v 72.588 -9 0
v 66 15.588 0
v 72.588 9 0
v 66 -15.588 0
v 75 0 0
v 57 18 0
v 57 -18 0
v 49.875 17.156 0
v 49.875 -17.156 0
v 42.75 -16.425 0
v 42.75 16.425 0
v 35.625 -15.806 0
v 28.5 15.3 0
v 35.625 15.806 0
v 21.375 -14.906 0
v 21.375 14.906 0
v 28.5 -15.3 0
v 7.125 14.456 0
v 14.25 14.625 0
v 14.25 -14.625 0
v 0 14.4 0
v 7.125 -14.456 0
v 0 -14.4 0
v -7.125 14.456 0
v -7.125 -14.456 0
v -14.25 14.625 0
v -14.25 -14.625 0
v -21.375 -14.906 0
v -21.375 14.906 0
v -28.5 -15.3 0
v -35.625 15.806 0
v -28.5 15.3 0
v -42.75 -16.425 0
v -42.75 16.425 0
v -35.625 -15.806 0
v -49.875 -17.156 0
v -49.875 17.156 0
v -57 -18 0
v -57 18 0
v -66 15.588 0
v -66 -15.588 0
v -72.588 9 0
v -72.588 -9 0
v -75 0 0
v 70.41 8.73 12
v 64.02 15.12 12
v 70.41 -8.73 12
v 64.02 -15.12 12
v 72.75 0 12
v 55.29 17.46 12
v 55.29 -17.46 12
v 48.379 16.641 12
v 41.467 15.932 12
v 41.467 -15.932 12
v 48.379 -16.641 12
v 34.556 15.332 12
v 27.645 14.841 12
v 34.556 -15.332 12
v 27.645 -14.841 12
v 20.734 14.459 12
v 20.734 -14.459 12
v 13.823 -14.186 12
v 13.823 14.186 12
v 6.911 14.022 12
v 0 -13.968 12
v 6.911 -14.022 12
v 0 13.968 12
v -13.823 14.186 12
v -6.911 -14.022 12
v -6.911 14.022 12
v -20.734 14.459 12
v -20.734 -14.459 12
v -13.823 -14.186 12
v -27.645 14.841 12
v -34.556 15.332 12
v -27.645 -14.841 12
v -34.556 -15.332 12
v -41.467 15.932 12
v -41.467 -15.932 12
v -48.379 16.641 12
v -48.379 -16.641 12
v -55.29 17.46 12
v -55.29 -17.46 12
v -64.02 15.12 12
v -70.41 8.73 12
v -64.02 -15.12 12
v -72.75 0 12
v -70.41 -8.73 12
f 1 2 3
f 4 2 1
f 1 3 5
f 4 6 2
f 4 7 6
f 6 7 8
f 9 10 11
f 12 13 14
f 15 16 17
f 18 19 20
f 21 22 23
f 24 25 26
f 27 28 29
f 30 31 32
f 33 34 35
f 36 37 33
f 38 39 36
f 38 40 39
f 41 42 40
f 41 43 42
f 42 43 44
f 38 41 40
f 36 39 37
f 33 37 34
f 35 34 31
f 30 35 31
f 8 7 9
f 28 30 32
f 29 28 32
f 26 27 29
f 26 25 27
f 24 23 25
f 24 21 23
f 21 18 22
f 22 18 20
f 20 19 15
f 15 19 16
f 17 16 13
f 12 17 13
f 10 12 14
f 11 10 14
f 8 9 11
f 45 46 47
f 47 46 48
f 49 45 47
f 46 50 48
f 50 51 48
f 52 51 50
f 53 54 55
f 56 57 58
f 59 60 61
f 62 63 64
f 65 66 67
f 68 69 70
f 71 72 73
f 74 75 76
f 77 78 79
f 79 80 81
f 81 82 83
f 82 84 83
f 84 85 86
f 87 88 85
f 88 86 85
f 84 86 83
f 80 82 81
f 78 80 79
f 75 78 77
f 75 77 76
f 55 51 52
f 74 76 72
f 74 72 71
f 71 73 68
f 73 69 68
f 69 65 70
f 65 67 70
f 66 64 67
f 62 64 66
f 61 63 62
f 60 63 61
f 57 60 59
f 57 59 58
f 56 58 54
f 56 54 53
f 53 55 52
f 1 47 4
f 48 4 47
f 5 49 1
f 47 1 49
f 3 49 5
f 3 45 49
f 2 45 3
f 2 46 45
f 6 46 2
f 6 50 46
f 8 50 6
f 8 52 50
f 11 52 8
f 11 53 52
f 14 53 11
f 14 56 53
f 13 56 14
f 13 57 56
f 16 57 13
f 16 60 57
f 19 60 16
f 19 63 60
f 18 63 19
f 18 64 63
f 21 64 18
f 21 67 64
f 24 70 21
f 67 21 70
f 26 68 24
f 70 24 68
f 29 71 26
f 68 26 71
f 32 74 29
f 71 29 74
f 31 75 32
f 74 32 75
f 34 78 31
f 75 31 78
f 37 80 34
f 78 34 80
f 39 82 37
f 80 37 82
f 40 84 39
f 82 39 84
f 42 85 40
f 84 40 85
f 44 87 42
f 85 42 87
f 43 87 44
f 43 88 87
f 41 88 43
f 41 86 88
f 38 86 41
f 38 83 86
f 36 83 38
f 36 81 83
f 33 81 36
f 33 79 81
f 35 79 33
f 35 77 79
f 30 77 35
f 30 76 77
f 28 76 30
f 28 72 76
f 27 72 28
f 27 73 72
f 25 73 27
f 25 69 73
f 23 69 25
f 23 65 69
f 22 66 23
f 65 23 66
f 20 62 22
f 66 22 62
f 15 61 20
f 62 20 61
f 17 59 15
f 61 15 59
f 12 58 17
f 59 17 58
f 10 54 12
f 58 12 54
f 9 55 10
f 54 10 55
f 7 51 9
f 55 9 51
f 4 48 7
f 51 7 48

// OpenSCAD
$fn = 32;

// ----------------------------------------------------------------------
// Handle: 150 x 36 mm grip, 12 mm thick
// ----------------------------------------------------------------------

// --- parameters (mm) ---
length = 150;             // grip length
width = 36;               // grip width
thickness = 12;           // grip thickness
waist = 0.8;              // width factor at the middle
draft = 0.97;             // top face scale of the extrusion

/* ergonomic grip outline, closed spline-like polygon in the XY plane */
grip = [[-57, 18], [-49.875, 17.156], [-42.75, 16.425], [-35.625, 15.806], [-28.5, 15.3], [-21.375, 14.906], [-14.25, 14.625], [-7.125, 14.456], [0, 14.4], [7.125, 14.456], [14.25, 14.625], [21.375, 14.906], [28.5, 15.3], [35.625, 15.806], [42.75, 16.425], [49.875, 17.156], [57, 18], [66, 15.588], [72.588, 9], [75, 0], [72.588, -9], [66, -15.588], [57, -18], [57, -18], [49.875, -17.156], [42.75, -16.425], [35.625, -15.806], [28.5, -15.3], [21.375, -14.906], [14.25, -14.625], [7.125, -14.456], [0, -14.4], [-7.125, -14.456], [-14.25, -14.625], [-21.375, -14.906], [-28.5, -15.3], [-35.625, -15.806], [-42.75, -16.425], [-49.875, -17.156], [-57, -18], [-66, -15.588], [-72.588, -9], [-75, 0], [-72.588, 9], [-66, 15.588], [-57, 18]];

module grip_body() {
  linear_extrude(height = thickness, scale = draft) polygon(grip);
}

difference() {
  union() {
    grip_body();
  }
}
